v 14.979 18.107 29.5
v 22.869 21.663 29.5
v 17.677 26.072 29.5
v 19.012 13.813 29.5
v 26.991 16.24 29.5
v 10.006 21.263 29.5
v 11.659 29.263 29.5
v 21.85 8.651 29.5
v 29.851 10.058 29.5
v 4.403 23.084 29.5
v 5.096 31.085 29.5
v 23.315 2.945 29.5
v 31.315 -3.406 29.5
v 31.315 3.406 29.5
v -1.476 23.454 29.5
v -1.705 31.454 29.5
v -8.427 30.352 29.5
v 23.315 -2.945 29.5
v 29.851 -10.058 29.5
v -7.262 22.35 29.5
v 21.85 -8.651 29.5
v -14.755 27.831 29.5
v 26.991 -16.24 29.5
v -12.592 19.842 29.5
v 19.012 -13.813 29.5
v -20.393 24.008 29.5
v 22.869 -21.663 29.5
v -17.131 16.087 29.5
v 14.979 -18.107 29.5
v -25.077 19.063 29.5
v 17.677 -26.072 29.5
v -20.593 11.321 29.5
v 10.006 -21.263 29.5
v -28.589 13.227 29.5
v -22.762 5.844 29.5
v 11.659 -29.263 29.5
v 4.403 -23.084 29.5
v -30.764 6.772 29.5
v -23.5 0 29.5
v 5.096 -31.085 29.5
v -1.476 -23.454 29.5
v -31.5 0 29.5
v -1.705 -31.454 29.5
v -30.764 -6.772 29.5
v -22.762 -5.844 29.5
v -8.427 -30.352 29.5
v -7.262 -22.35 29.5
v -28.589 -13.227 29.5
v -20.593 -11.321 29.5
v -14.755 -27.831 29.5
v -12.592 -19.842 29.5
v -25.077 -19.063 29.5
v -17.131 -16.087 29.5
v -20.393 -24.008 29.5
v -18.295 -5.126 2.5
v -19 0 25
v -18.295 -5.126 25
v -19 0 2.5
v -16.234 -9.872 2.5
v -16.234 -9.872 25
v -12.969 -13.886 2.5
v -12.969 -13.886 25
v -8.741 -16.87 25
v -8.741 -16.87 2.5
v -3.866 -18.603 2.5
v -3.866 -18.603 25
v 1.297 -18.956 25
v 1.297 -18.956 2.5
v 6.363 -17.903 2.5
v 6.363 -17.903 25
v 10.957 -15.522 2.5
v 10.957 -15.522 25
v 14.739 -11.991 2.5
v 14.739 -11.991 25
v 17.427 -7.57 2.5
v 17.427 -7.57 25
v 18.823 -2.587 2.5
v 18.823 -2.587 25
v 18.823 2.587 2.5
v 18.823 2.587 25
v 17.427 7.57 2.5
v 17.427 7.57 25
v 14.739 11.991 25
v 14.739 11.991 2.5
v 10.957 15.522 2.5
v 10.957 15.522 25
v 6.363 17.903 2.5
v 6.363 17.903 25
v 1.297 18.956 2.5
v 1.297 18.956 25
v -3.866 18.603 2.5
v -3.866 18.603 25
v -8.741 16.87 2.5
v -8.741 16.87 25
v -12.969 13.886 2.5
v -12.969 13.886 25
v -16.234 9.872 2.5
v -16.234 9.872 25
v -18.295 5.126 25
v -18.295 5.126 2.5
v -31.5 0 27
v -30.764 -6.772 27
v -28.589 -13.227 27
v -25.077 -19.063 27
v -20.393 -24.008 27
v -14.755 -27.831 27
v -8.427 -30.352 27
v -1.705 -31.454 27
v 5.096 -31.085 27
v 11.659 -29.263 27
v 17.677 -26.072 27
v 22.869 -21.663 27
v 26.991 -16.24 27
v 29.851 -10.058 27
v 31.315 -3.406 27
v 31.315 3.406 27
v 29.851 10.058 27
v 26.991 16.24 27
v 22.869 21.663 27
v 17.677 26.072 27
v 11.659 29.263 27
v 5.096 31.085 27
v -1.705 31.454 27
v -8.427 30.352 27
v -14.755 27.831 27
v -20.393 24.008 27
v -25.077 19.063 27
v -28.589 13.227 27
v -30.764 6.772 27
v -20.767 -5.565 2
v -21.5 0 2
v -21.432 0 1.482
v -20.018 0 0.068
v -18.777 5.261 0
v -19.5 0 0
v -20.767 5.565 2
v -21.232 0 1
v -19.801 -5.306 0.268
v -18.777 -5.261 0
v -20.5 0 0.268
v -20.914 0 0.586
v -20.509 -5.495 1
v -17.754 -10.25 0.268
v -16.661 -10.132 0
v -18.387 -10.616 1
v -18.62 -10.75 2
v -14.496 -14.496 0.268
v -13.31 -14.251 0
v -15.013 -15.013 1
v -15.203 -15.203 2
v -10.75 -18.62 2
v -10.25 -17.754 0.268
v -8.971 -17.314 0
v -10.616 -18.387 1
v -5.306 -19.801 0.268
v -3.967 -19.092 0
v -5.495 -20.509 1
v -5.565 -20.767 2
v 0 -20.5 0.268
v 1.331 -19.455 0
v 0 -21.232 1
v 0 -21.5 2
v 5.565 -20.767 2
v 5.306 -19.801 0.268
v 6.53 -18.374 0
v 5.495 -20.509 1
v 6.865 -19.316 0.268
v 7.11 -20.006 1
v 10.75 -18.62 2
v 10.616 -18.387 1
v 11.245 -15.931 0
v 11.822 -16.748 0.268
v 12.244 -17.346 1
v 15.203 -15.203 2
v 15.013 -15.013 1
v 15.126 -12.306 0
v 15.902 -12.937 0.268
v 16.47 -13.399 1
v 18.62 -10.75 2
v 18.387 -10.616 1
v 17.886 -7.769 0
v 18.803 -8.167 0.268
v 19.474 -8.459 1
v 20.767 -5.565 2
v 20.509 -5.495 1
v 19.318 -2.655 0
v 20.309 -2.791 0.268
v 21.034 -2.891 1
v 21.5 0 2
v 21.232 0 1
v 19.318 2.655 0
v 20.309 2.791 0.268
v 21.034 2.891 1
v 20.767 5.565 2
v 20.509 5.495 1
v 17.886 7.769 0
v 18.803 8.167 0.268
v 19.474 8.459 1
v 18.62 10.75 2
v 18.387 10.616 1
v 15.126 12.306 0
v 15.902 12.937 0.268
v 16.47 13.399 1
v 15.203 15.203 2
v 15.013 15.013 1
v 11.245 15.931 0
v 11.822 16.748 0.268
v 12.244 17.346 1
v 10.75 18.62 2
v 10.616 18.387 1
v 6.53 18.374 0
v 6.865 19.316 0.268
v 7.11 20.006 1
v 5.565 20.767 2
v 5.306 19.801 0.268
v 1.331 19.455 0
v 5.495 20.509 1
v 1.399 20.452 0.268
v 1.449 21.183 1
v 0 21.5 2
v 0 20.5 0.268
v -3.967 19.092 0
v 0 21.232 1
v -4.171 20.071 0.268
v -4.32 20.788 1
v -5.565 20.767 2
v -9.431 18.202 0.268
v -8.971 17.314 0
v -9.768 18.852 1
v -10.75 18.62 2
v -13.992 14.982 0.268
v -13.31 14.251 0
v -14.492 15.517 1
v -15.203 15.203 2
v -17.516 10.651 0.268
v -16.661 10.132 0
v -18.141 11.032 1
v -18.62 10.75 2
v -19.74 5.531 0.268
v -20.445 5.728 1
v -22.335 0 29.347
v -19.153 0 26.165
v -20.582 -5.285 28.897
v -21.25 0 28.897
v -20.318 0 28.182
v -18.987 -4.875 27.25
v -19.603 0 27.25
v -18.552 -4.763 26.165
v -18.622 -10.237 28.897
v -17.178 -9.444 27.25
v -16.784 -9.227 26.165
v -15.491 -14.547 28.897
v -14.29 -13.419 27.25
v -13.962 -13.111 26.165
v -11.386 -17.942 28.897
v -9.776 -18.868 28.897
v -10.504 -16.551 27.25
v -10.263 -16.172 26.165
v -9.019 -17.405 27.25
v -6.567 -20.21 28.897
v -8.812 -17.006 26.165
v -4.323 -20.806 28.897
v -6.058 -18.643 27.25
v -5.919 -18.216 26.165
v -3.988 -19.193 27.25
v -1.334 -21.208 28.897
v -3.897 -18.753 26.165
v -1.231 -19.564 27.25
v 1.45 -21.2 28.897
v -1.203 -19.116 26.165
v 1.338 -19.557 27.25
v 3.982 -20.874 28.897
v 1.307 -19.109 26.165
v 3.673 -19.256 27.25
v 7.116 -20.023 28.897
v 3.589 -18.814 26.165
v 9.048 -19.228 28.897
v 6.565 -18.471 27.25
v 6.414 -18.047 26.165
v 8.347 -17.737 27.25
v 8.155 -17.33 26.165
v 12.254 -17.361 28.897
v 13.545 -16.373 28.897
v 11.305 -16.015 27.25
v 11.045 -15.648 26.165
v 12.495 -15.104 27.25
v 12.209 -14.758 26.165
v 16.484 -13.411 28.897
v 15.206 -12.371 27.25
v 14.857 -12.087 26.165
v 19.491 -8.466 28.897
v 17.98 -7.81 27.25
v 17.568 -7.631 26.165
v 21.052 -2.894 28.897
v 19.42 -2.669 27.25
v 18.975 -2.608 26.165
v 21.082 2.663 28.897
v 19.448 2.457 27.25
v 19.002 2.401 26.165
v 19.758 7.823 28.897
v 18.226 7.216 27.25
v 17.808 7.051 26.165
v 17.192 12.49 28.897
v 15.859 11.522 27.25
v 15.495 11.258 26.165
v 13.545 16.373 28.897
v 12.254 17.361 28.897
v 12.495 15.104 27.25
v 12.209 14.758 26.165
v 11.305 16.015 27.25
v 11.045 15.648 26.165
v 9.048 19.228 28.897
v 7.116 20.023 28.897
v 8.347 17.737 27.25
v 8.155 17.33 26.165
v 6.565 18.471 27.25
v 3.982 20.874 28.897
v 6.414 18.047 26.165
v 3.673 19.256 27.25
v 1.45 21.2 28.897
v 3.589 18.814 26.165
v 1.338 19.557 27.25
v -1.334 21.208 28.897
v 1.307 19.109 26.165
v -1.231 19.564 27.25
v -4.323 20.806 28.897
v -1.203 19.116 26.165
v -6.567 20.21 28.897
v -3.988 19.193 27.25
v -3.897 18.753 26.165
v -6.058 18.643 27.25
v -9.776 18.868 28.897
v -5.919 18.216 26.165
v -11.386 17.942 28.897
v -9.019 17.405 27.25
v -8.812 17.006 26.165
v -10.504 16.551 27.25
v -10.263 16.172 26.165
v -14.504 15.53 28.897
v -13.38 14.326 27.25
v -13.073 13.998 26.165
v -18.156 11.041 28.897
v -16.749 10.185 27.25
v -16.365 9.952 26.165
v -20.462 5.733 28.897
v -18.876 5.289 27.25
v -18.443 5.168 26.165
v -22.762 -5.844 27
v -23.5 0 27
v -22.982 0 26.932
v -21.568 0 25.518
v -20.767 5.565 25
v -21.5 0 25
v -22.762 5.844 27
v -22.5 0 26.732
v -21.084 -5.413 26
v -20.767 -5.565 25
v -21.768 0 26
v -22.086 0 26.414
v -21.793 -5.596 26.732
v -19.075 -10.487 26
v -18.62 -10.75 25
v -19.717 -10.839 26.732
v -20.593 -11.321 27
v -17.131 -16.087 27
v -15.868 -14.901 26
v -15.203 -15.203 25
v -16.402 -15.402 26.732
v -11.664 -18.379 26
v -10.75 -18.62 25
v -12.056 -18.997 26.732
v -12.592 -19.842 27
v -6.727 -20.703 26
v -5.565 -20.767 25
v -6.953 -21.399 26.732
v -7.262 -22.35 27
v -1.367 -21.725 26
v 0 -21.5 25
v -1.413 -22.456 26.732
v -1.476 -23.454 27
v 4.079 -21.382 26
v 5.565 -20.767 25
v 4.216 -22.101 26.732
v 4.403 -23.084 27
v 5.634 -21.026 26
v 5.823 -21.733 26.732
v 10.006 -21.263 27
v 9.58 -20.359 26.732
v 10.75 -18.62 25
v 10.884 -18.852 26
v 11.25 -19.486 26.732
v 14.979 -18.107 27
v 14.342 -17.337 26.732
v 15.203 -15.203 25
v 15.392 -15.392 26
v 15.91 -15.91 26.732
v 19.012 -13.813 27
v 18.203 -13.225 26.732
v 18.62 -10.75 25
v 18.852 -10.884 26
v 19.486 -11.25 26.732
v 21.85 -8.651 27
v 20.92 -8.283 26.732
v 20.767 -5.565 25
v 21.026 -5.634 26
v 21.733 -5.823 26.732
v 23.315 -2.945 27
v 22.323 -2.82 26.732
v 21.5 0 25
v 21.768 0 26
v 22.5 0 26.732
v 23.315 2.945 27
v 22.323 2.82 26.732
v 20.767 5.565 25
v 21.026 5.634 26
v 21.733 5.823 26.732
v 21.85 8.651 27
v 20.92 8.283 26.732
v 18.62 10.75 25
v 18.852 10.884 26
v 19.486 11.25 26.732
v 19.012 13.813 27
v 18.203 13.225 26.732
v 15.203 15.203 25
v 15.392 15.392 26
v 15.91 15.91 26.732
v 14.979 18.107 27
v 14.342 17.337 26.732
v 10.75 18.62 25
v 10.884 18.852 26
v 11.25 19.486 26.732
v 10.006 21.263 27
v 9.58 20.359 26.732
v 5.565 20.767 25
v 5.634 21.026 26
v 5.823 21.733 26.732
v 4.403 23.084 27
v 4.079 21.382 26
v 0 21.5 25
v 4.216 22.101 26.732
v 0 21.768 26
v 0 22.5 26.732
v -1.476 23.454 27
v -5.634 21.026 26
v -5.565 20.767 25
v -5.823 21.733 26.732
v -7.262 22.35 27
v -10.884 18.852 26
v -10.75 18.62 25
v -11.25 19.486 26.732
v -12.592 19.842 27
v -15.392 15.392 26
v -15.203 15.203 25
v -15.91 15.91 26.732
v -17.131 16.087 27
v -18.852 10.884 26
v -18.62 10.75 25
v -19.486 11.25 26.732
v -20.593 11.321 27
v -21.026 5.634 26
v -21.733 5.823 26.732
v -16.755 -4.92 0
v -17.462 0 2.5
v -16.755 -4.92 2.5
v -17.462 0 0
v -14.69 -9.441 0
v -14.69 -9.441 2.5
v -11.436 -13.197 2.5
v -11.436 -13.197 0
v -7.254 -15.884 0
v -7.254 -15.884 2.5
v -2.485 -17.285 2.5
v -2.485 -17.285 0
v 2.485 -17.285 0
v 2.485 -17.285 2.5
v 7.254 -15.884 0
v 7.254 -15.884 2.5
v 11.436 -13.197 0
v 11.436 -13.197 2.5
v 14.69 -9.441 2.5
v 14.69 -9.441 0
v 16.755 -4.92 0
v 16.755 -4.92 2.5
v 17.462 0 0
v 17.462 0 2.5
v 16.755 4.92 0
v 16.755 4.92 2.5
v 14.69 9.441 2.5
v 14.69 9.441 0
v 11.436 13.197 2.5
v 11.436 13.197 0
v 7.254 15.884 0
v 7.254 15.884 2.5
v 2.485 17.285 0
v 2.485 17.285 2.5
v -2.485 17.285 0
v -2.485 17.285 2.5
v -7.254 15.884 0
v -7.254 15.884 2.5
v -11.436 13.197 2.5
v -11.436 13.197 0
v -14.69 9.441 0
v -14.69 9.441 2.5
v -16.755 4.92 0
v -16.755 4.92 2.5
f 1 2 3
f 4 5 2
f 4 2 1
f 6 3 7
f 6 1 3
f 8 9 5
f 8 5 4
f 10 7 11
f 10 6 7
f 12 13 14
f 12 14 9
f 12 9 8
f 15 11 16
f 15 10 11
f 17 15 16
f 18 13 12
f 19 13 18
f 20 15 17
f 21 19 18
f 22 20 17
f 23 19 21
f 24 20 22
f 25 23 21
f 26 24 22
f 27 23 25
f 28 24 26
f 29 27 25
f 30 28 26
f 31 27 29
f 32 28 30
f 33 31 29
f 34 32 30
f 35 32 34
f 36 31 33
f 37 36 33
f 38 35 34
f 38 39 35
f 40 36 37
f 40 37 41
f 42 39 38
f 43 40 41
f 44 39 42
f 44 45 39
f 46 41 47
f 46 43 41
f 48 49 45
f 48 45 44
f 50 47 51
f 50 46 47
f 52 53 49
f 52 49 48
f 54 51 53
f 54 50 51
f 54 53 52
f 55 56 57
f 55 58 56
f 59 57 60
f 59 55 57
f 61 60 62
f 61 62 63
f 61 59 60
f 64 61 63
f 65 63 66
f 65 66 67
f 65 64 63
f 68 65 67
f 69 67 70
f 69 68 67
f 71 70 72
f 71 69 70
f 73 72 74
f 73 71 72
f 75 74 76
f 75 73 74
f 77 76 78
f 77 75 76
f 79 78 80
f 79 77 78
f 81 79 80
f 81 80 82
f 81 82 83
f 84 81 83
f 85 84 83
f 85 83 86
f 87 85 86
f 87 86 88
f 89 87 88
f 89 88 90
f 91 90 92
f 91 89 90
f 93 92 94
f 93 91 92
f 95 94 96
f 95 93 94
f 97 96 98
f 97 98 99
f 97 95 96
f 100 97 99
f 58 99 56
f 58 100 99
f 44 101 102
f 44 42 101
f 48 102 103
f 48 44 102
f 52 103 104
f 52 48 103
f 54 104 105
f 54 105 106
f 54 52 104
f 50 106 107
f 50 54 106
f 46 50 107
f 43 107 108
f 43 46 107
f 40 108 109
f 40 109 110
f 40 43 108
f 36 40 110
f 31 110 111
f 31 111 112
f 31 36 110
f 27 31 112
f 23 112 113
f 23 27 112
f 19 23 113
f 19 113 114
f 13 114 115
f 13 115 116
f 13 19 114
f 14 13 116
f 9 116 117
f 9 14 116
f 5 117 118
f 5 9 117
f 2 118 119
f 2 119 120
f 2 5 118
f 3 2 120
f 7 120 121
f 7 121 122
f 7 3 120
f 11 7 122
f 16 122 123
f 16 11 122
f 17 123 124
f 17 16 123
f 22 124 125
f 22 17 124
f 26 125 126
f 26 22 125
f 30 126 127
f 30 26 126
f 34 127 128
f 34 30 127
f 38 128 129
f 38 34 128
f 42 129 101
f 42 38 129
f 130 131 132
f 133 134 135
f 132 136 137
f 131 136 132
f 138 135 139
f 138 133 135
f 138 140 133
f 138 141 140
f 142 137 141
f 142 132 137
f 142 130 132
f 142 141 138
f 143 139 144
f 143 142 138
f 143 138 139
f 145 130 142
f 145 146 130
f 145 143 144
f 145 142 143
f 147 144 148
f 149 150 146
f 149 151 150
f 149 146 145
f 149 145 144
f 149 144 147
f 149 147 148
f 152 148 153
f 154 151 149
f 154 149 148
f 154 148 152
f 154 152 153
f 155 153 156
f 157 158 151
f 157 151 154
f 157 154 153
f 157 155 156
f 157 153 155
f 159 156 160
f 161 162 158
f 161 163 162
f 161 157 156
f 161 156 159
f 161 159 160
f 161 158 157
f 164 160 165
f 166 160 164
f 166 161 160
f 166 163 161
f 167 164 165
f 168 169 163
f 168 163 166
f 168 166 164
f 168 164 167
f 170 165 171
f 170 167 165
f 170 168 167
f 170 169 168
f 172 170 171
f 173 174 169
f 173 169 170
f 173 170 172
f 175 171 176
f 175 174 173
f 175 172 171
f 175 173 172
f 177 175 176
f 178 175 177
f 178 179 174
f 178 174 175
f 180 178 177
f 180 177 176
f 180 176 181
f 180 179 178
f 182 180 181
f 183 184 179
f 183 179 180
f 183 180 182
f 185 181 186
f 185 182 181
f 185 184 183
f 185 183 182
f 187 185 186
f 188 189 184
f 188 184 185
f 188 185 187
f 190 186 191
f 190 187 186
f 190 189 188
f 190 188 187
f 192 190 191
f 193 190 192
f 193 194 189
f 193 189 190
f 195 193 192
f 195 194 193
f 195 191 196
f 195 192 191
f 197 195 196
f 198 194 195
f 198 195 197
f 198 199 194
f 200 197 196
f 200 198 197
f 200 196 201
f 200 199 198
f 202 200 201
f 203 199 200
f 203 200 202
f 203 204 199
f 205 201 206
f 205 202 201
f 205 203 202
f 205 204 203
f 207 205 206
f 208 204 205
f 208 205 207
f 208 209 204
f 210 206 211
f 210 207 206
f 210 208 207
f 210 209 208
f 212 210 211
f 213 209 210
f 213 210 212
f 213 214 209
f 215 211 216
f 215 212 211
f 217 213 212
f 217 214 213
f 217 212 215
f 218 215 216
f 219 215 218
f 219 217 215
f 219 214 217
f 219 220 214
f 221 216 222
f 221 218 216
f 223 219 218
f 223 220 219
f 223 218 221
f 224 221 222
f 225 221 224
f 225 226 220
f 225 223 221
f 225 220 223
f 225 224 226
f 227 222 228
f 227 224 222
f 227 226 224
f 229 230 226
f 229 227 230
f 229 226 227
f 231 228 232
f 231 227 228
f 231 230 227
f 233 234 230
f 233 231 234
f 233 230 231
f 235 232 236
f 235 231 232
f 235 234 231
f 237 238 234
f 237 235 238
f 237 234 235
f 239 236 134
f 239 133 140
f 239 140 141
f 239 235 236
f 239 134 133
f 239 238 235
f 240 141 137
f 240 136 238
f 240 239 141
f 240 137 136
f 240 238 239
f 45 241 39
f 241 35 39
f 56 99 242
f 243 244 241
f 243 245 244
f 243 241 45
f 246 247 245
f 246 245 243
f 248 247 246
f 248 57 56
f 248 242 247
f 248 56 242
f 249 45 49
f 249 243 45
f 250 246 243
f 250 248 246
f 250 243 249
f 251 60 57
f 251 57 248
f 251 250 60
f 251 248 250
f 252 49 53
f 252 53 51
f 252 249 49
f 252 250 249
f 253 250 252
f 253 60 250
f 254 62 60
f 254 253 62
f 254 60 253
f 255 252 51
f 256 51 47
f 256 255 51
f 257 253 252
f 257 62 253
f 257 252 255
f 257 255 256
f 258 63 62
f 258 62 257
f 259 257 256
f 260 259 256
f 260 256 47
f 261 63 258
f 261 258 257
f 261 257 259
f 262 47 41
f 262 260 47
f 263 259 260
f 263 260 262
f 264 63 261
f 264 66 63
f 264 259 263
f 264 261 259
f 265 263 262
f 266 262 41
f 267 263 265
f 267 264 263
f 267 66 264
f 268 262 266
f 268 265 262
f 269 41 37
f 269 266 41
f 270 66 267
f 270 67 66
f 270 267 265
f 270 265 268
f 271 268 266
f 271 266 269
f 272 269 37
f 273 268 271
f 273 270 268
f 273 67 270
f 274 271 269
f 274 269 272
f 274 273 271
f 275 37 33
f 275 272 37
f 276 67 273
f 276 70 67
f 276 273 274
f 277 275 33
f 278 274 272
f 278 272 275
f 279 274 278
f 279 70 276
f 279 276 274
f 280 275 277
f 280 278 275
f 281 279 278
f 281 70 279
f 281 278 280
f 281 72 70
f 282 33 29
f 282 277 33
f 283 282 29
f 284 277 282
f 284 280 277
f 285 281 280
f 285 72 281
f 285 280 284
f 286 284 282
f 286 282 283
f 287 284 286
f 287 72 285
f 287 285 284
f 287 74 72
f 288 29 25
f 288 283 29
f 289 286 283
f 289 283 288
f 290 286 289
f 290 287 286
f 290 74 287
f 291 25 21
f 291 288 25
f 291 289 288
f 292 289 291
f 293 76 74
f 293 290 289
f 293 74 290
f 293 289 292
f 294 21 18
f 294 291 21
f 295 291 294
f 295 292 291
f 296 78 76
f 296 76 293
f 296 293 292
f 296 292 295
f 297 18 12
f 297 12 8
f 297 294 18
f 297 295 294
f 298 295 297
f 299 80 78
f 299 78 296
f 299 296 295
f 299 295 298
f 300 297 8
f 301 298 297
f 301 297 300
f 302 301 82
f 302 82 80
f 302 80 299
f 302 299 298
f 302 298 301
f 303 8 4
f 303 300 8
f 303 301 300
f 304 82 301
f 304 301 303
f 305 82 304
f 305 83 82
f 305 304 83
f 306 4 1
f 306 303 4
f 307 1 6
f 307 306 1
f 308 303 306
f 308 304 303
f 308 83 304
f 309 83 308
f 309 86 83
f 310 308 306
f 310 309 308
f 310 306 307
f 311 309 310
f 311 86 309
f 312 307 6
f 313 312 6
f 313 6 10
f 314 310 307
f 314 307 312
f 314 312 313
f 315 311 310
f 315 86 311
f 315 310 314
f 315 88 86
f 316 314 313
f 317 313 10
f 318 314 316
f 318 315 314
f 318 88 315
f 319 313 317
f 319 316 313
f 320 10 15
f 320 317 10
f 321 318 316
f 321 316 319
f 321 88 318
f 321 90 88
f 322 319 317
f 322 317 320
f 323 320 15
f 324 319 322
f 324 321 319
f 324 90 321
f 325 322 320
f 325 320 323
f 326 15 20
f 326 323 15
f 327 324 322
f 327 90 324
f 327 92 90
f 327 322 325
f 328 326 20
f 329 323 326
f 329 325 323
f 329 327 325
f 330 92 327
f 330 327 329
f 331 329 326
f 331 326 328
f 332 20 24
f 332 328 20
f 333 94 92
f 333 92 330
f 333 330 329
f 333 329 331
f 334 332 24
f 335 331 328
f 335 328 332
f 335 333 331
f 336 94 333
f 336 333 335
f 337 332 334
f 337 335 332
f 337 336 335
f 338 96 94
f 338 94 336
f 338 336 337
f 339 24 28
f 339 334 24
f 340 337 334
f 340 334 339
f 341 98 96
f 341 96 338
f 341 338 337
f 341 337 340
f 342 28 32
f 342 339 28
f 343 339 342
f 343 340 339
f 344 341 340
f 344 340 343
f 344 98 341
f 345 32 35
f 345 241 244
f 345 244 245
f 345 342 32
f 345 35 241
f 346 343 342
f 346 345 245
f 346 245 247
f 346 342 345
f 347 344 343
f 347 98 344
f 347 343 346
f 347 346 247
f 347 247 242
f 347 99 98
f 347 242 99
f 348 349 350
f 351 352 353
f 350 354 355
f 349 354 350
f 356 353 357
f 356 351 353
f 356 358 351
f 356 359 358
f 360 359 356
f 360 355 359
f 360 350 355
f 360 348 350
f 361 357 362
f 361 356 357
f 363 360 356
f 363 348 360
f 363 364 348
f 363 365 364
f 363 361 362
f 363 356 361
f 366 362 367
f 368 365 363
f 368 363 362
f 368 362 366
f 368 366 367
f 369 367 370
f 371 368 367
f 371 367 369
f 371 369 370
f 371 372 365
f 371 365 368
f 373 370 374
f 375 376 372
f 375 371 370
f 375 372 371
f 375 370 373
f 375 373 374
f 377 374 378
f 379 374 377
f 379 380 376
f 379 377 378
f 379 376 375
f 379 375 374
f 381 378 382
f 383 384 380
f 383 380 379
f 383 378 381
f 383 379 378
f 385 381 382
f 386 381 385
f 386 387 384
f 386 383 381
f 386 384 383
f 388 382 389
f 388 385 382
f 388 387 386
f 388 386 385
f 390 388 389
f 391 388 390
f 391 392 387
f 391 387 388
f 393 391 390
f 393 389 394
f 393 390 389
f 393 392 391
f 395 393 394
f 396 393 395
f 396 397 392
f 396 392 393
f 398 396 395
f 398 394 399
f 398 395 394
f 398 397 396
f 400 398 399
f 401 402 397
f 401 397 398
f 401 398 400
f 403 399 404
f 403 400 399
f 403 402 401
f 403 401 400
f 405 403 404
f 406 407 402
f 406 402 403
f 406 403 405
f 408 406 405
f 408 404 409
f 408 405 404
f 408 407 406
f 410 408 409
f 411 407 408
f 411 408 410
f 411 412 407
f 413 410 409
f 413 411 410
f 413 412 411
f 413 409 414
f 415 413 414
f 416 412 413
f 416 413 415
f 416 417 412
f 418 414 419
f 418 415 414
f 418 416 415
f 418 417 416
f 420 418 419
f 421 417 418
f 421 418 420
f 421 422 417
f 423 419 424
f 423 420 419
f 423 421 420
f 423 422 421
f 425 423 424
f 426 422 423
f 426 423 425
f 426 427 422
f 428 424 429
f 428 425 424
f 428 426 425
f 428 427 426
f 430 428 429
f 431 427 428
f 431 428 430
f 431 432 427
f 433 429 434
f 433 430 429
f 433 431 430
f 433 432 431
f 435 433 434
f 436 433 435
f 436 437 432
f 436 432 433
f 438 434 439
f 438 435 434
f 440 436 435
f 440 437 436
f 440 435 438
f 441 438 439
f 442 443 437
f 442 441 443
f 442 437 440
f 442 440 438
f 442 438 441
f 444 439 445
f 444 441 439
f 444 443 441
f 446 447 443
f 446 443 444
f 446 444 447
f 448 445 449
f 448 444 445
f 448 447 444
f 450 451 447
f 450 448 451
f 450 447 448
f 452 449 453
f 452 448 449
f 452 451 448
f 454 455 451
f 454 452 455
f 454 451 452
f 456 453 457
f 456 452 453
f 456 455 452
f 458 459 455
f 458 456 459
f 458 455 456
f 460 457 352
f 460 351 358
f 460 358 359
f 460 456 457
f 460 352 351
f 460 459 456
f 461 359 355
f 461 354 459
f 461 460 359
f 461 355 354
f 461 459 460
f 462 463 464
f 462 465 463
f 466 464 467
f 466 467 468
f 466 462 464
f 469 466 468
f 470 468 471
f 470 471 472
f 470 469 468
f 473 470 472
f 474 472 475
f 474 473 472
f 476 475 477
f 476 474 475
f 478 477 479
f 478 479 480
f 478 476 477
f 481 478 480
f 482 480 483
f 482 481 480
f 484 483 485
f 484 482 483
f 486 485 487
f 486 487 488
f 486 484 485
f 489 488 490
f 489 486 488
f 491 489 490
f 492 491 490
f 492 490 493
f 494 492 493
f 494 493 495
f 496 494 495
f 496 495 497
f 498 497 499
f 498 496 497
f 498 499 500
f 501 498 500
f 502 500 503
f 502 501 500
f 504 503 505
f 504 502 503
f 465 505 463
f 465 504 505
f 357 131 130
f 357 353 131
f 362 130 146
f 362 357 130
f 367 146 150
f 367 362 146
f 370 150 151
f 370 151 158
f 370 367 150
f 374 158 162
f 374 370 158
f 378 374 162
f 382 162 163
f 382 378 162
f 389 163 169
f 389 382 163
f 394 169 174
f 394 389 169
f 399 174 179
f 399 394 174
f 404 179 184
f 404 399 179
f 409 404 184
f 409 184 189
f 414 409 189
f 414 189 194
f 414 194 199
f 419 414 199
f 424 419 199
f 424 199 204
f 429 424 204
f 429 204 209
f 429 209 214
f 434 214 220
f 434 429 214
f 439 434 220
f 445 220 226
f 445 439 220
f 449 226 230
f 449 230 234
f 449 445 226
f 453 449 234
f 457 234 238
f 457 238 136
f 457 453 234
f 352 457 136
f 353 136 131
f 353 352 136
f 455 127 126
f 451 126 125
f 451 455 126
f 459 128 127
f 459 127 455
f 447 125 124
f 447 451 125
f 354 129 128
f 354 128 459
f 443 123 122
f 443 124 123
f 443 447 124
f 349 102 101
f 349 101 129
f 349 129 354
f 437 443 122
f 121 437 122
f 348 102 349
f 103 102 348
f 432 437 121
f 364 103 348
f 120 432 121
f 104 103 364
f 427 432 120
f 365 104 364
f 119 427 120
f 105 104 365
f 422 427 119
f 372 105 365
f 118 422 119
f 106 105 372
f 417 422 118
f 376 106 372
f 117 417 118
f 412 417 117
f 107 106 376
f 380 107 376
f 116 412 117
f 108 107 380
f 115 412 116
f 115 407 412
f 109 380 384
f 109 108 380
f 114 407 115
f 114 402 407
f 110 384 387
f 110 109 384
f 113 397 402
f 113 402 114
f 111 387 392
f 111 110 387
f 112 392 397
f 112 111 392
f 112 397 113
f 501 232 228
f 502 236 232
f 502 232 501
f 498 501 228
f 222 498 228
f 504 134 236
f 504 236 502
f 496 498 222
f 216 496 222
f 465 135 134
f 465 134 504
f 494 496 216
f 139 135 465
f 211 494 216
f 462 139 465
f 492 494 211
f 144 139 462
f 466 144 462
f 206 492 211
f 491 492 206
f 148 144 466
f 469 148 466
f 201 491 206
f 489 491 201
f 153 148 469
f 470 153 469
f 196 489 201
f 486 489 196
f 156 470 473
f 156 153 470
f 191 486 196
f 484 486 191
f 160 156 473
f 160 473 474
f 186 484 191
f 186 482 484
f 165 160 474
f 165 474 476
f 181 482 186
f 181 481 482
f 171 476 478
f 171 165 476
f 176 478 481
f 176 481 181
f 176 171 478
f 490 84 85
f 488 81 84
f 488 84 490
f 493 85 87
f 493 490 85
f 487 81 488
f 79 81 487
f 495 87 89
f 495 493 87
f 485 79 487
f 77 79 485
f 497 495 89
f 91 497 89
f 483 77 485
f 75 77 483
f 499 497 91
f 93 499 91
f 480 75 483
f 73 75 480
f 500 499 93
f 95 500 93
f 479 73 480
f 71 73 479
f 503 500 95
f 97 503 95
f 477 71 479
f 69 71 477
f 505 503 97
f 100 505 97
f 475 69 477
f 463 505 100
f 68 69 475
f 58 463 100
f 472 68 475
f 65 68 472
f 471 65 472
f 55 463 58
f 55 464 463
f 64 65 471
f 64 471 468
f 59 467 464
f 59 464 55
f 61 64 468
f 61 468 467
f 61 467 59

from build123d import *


with BuildPart() as part:
    # Sketch1 → Revolve1 (revolve)
    with BuildSketch(Plane(origin=(0, 0, 0), x_dir=(0, 0, -1), z_dir=(1, 0, 0)), mode=Mode.PRIVATE) as revolve1_sk:
        with BuildLine():
            Line((0, 17.4625), (0, 19.5))
            ThreePointArc((0, 19.5), (-0.585786438, 20.914213562), (-2, 21.5))
            Line((-2, 21.5), (-25, 21.5))
            ThreePointArc((-25, 21.5), (-26.414213562, 22.085786438), (-27, 23.5))
            Line((-27, 23.5), (-27, 31.5))
            Line((-27, 31.5), (-29.5, 31.5))
            Line((-29.5, 31.5), (-29.5, 23.5))
            ThreePointArc((-29.5, 23.5), (-28.181980515, 20.318019485), (-25, 19))
            Line((-25, 19), (-2.5, 19))
            Line((-2.5, 19), (-2.5, 17.4625))
            Line((-2.5, 17.4625), (0, 17.4625))
        make_face()
    revolve(revolve1_sk.sketch.rotate(Axis((0, 0, 0), (0, 0, 1)), 90), axis=Axis((0, 0, 0), (0, 0, 1)))


solid = part.part
